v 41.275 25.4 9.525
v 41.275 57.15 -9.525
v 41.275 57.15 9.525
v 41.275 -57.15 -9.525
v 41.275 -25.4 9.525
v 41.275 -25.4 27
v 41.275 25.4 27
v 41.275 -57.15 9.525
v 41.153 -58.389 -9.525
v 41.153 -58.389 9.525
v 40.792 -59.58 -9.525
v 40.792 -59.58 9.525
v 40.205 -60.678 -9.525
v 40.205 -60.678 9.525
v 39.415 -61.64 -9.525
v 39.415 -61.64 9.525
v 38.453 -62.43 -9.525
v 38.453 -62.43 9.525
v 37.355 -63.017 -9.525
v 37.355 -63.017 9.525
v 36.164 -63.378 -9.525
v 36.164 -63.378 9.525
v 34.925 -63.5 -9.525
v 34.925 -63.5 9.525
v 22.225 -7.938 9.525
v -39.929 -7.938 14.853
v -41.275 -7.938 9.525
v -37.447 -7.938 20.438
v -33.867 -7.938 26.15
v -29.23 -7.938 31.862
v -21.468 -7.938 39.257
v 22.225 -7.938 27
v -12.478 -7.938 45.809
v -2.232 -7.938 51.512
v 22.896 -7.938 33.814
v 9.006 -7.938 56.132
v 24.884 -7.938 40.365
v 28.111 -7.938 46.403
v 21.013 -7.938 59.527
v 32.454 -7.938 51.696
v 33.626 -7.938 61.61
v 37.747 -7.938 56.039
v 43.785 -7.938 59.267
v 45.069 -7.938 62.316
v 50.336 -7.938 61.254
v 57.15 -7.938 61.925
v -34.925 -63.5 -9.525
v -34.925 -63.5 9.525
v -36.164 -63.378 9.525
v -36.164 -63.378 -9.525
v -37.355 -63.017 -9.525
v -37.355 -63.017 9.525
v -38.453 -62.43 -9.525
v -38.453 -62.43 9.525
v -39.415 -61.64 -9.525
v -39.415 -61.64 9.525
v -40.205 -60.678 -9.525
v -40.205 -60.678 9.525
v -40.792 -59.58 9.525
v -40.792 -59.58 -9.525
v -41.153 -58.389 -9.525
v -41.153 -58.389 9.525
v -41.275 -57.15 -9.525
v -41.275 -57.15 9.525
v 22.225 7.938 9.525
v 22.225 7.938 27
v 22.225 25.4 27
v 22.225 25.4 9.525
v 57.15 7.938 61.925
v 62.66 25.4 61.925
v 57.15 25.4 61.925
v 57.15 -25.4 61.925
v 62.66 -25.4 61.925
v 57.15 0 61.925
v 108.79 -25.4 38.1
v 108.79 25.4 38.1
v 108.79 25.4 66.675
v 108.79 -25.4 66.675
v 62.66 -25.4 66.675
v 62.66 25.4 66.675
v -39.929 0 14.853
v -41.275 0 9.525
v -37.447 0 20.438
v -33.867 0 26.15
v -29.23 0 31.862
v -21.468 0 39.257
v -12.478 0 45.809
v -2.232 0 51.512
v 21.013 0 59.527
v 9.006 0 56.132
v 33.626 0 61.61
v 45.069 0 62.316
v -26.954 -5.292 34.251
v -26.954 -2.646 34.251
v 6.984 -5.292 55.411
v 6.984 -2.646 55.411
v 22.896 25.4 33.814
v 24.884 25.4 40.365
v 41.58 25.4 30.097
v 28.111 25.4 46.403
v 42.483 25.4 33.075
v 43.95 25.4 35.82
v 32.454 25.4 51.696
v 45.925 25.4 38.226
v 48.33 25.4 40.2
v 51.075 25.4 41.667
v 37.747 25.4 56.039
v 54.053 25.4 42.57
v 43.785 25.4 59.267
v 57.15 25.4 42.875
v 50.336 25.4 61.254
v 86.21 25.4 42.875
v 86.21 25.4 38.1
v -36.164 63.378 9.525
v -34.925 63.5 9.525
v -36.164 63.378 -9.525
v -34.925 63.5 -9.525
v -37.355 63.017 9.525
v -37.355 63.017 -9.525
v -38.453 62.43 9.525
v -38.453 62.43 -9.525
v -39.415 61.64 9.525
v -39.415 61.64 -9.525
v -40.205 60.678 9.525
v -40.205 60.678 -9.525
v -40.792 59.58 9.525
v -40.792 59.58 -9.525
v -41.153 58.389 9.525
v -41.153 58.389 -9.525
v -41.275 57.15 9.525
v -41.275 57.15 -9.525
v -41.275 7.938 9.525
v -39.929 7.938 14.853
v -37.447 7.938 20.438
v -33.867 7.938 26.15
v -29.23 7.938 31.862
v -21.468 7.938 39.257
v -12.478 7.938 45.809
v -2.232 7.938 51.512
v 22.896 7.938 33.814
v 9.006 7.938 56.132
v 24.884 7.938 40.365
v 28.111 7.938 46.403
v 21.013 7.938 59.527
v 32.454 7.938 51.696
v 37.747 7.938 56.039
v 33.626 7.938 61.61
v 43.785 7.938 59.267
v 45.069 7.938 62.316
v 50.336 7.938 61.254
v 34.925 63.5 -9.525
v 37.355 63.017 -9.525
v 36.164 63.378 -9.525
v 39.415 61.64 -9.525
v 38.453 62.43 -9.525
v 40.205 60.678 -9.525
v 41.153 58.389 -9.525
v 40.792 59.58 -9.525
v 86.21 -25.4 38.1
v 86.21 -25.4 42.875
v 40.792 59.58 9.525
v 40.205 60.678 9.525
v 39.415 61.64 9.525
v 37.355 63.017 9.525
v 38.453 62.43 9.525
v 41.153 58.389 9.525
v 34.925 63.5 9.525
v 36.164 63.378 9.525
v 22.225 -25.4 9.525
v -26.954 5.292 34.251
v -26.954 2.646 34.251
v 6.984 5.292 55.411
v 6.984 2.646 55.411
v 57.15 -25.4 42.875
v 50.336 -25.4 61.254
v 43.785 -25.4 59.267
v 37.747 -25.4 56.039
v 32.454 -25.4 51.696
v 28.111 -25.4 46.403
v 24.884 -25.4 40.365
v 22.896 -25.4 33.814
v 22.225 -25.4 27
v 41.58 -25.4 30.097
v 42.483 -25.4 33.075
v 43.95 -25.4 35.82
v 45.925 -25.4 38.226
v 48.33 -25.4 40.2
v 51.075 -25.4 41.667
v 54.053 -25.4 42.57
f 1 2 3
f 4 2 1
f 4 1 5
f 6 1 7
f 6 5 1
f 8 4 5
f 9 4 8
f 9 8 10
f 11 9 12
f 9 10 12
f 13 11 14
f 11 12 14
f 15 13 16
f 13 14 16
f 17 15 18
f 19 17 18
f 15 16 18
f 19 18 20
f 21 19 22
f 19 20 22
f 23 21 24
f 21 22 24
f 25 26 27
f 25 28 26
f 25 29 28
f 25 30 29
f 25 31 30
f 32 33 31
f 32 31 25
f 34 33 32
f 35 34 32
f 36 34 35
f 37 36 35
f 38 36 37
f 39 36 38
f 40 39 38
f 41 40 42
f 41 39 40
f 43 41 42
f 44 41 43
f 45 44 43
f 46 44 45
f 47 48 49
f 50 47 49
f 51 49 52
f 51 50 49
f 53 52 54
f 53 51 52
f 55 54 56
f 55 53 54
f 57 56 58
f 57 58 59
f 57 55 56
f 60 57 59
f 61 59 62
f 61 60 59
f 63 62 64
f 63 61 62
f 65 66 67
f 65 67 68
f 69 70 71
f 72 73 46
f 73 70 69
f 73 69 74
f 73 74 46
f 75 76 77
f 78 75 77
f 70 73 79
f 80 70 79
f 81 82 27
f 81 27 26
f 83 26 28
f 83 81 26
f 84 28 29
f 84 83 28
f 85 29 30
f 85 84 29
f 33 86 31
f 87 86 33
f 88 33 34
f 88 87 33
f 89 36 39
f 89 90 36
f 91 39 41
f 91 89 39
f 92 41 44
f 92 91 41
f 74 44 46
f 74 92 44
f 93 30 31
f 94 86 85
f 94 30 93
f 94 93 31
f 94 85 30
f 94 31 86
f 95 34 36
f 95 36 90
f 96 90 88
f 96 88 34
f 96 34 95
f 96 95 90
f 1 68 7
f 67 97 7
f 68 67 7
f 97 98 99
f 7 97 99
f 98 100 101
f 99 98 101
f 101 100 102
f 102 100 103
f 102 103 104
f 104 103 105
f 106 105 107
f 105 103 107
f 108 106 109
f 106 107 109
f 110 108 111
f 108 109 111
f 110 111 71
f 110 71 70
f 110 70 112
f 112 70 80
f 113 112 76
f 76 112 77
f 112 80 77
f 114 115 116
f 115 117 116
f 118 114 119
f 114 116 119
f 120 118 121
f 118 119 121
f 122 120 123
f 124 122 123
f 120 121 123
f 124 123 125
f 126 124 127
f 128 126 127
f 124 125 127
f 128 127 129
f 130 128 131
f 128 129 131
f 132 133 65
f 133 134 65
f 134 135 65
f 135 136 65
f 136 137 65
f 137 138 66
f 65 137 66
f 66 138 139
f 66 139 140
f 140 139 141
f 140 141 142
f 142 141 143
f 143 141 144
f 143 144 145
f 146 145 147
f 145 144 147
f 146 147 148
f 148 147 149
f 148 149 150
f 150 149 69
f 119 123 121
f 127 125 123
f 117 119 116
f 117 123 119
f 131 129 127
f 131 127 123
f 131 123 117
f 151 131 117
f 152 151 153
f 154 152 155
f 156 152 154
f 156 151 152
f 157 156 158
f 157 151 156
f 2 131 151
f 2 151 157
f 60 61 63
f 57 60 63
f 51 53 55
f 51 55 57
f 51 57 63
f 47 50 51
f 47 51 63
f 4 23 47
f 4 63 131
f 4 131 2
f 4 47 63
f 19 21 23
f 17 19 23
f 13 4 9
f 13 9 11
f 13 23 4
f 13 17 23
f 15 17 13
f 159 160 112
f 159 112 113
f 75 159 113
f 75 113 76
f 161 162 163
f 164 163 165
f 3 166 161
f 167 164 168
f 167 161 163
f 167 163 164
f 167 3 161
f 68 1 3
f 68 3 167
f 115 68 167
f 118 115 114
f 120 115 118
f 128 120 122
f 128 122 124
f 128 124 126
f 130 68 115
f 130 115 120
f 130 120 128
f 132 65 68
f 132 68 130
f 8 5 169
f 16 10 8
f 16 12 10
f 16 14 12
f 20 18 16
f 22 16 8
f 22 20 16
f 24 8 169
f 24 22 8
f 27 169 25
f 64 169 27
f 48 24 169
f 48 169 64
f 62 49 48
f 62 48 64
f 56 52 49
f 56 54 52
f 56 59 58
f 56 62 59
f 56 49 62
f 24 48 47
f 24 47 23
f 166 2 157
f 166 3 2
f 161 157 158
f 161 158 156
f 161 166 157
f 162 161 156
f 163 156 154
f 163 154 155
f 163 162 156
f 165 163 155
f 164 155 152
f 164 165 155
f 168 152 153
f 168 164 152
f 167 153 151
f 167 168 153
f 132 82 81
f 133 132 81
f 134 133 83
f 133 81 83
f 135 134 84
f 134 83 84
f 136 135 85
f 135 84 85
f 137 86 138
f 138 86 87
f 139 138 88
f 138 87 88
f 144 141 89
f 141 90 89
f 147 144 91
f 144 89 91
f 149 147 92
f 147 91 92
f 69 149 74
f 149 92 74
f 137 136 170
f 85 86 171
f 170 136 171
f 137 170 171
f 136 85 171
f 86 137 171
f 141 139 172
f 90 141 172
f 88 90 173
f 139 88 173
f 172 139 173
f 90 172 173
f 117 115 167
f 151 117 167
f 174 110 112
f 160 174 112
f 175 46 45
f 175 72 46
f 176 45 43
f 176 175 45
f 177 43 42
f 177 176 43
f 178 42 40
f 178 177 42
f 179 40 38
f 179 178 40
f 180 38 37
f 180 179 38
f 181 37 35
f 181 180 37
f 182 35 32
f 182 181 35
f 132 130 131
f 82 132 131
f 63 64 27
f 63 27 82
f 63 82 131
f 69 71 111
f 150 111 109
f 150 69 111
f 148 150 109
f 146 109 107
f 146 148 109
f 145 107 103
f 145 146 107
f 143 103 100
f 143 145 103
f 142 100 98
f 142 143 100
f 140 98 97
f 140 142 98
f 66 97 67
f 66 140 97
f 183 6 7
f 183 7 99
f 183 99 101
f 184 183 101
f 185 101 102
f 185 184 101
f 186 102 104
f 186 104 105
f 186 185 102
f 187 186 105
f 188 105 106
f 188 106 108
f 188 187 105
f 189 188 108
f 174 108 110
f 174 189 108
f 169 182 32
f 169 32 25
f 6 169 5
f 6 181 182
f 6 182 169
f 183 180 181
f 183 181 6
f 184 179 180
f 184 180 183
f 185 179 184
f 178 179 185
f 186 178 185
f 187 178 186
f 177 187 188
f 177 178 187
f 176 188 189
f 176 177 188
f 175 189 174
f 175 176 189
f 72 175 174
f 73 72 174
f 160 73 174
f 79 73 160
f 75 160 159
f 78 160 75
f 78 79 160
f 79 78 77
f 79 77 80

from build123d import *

# Parameters (mm, degrees)
F1_DEPTH = 63.5
F0_W     = 23.5502142146
F0_H     = 19.05
F0_H_2   = 4.7498
F2_DEPTH = 25.4
F3_DEPTH = 7.9375
F4_R     = 6.35


with BuildPart() as f1:
    # F0 (on Front) → F1 (new body, symmetric)
    with BuildSketch(Plane.XZ):
        Polygon((41.275, -9.525), (41.275, 9.525), (22.225, 9.525), (-41.275, 9.525), (-41.275, -9.525), align=None)
    extrude(amount=F1_DEPTH, both=True)

    # F0 (on Front) → F2 (join, symmetric)
    with BuildSketch(Plane.XZ):
        with BuildLine():
            Line((22.225, 9.525), (41.275, 9.525))
            Line((41.275, 9.525), (41.275, 27.0002))
            ThreePointArc((41.275, 27.0002), (45.9246798487, 38.2255201513), (57.15, 42.8752))
            Line((57.15, 42.8752), (62.6595669536, 42.8752))
            Line((62.6595669536, 42.8752), (62.6595669536, 61.9252))
            Line((62.6595669536, 61.9252), (57.15, 61.9252))
            ThreePointArc((57.15, 61.9252), (32.4542956671, 51.6959043329), (22.225, 27.0002))
            Line((22.225, 27.0002), (22.225, 9.525))
        make_face()
        with Locations((74.4346740609, 52.4002)):
            Rectangle(F0_W, F0_H)
        Polygon((86.2097811682, 61.9252), (86.2097811682, 42.8752), (86.2097811682, 38.1), (108.7904330464, 38.1), (108.7904330464, 66.675), (86.2097811682, 66.675), align=None)
        with Locations((74.4346740609, 64.3001)):
            Rectangle(F0_W, F0_H_2)
    extrude(amount=F2_DEPTH, both=True)

    # F0 (on Front) → F3 (join, symmetric)
    with BuildSketch(Plane.XZ):
        with BuildLine():
            Line((-41.275, 9.525), (22.225, 9.525))
            Line((22.225, 9.525), (22.225, 27.0002))
            ThreePointArc((22.225, 27.0002), (32.4542956671, 51.6959043329), (57.15, 61.9252))
            add(Edge.make_bspline(
                [(-41.275, 9.525), (-37.8933270554, 32.3415985166), (0, 66.4274916053), (57.15, 61.9252)],
                knots=[0, 0, 0, 0, 111.5045361635, 111.5045361635, 111.5045361635, 111.5045361635], degree=3))
        make_face()
    extrude(amount=F3_DEPTH, both=True)

    # F4
    f4_edges = [f1.edges().sort_by_distance(p)[0] for p in [
        (41.275, 63.5, 0),
        (-41.275, 63.5, 0),
        (41.275, -63.5, 0),
        (-41.275, -63.5, 0),
    ]]
    fillet(f4_edges, radius=F4_R)


solid = f1.part
